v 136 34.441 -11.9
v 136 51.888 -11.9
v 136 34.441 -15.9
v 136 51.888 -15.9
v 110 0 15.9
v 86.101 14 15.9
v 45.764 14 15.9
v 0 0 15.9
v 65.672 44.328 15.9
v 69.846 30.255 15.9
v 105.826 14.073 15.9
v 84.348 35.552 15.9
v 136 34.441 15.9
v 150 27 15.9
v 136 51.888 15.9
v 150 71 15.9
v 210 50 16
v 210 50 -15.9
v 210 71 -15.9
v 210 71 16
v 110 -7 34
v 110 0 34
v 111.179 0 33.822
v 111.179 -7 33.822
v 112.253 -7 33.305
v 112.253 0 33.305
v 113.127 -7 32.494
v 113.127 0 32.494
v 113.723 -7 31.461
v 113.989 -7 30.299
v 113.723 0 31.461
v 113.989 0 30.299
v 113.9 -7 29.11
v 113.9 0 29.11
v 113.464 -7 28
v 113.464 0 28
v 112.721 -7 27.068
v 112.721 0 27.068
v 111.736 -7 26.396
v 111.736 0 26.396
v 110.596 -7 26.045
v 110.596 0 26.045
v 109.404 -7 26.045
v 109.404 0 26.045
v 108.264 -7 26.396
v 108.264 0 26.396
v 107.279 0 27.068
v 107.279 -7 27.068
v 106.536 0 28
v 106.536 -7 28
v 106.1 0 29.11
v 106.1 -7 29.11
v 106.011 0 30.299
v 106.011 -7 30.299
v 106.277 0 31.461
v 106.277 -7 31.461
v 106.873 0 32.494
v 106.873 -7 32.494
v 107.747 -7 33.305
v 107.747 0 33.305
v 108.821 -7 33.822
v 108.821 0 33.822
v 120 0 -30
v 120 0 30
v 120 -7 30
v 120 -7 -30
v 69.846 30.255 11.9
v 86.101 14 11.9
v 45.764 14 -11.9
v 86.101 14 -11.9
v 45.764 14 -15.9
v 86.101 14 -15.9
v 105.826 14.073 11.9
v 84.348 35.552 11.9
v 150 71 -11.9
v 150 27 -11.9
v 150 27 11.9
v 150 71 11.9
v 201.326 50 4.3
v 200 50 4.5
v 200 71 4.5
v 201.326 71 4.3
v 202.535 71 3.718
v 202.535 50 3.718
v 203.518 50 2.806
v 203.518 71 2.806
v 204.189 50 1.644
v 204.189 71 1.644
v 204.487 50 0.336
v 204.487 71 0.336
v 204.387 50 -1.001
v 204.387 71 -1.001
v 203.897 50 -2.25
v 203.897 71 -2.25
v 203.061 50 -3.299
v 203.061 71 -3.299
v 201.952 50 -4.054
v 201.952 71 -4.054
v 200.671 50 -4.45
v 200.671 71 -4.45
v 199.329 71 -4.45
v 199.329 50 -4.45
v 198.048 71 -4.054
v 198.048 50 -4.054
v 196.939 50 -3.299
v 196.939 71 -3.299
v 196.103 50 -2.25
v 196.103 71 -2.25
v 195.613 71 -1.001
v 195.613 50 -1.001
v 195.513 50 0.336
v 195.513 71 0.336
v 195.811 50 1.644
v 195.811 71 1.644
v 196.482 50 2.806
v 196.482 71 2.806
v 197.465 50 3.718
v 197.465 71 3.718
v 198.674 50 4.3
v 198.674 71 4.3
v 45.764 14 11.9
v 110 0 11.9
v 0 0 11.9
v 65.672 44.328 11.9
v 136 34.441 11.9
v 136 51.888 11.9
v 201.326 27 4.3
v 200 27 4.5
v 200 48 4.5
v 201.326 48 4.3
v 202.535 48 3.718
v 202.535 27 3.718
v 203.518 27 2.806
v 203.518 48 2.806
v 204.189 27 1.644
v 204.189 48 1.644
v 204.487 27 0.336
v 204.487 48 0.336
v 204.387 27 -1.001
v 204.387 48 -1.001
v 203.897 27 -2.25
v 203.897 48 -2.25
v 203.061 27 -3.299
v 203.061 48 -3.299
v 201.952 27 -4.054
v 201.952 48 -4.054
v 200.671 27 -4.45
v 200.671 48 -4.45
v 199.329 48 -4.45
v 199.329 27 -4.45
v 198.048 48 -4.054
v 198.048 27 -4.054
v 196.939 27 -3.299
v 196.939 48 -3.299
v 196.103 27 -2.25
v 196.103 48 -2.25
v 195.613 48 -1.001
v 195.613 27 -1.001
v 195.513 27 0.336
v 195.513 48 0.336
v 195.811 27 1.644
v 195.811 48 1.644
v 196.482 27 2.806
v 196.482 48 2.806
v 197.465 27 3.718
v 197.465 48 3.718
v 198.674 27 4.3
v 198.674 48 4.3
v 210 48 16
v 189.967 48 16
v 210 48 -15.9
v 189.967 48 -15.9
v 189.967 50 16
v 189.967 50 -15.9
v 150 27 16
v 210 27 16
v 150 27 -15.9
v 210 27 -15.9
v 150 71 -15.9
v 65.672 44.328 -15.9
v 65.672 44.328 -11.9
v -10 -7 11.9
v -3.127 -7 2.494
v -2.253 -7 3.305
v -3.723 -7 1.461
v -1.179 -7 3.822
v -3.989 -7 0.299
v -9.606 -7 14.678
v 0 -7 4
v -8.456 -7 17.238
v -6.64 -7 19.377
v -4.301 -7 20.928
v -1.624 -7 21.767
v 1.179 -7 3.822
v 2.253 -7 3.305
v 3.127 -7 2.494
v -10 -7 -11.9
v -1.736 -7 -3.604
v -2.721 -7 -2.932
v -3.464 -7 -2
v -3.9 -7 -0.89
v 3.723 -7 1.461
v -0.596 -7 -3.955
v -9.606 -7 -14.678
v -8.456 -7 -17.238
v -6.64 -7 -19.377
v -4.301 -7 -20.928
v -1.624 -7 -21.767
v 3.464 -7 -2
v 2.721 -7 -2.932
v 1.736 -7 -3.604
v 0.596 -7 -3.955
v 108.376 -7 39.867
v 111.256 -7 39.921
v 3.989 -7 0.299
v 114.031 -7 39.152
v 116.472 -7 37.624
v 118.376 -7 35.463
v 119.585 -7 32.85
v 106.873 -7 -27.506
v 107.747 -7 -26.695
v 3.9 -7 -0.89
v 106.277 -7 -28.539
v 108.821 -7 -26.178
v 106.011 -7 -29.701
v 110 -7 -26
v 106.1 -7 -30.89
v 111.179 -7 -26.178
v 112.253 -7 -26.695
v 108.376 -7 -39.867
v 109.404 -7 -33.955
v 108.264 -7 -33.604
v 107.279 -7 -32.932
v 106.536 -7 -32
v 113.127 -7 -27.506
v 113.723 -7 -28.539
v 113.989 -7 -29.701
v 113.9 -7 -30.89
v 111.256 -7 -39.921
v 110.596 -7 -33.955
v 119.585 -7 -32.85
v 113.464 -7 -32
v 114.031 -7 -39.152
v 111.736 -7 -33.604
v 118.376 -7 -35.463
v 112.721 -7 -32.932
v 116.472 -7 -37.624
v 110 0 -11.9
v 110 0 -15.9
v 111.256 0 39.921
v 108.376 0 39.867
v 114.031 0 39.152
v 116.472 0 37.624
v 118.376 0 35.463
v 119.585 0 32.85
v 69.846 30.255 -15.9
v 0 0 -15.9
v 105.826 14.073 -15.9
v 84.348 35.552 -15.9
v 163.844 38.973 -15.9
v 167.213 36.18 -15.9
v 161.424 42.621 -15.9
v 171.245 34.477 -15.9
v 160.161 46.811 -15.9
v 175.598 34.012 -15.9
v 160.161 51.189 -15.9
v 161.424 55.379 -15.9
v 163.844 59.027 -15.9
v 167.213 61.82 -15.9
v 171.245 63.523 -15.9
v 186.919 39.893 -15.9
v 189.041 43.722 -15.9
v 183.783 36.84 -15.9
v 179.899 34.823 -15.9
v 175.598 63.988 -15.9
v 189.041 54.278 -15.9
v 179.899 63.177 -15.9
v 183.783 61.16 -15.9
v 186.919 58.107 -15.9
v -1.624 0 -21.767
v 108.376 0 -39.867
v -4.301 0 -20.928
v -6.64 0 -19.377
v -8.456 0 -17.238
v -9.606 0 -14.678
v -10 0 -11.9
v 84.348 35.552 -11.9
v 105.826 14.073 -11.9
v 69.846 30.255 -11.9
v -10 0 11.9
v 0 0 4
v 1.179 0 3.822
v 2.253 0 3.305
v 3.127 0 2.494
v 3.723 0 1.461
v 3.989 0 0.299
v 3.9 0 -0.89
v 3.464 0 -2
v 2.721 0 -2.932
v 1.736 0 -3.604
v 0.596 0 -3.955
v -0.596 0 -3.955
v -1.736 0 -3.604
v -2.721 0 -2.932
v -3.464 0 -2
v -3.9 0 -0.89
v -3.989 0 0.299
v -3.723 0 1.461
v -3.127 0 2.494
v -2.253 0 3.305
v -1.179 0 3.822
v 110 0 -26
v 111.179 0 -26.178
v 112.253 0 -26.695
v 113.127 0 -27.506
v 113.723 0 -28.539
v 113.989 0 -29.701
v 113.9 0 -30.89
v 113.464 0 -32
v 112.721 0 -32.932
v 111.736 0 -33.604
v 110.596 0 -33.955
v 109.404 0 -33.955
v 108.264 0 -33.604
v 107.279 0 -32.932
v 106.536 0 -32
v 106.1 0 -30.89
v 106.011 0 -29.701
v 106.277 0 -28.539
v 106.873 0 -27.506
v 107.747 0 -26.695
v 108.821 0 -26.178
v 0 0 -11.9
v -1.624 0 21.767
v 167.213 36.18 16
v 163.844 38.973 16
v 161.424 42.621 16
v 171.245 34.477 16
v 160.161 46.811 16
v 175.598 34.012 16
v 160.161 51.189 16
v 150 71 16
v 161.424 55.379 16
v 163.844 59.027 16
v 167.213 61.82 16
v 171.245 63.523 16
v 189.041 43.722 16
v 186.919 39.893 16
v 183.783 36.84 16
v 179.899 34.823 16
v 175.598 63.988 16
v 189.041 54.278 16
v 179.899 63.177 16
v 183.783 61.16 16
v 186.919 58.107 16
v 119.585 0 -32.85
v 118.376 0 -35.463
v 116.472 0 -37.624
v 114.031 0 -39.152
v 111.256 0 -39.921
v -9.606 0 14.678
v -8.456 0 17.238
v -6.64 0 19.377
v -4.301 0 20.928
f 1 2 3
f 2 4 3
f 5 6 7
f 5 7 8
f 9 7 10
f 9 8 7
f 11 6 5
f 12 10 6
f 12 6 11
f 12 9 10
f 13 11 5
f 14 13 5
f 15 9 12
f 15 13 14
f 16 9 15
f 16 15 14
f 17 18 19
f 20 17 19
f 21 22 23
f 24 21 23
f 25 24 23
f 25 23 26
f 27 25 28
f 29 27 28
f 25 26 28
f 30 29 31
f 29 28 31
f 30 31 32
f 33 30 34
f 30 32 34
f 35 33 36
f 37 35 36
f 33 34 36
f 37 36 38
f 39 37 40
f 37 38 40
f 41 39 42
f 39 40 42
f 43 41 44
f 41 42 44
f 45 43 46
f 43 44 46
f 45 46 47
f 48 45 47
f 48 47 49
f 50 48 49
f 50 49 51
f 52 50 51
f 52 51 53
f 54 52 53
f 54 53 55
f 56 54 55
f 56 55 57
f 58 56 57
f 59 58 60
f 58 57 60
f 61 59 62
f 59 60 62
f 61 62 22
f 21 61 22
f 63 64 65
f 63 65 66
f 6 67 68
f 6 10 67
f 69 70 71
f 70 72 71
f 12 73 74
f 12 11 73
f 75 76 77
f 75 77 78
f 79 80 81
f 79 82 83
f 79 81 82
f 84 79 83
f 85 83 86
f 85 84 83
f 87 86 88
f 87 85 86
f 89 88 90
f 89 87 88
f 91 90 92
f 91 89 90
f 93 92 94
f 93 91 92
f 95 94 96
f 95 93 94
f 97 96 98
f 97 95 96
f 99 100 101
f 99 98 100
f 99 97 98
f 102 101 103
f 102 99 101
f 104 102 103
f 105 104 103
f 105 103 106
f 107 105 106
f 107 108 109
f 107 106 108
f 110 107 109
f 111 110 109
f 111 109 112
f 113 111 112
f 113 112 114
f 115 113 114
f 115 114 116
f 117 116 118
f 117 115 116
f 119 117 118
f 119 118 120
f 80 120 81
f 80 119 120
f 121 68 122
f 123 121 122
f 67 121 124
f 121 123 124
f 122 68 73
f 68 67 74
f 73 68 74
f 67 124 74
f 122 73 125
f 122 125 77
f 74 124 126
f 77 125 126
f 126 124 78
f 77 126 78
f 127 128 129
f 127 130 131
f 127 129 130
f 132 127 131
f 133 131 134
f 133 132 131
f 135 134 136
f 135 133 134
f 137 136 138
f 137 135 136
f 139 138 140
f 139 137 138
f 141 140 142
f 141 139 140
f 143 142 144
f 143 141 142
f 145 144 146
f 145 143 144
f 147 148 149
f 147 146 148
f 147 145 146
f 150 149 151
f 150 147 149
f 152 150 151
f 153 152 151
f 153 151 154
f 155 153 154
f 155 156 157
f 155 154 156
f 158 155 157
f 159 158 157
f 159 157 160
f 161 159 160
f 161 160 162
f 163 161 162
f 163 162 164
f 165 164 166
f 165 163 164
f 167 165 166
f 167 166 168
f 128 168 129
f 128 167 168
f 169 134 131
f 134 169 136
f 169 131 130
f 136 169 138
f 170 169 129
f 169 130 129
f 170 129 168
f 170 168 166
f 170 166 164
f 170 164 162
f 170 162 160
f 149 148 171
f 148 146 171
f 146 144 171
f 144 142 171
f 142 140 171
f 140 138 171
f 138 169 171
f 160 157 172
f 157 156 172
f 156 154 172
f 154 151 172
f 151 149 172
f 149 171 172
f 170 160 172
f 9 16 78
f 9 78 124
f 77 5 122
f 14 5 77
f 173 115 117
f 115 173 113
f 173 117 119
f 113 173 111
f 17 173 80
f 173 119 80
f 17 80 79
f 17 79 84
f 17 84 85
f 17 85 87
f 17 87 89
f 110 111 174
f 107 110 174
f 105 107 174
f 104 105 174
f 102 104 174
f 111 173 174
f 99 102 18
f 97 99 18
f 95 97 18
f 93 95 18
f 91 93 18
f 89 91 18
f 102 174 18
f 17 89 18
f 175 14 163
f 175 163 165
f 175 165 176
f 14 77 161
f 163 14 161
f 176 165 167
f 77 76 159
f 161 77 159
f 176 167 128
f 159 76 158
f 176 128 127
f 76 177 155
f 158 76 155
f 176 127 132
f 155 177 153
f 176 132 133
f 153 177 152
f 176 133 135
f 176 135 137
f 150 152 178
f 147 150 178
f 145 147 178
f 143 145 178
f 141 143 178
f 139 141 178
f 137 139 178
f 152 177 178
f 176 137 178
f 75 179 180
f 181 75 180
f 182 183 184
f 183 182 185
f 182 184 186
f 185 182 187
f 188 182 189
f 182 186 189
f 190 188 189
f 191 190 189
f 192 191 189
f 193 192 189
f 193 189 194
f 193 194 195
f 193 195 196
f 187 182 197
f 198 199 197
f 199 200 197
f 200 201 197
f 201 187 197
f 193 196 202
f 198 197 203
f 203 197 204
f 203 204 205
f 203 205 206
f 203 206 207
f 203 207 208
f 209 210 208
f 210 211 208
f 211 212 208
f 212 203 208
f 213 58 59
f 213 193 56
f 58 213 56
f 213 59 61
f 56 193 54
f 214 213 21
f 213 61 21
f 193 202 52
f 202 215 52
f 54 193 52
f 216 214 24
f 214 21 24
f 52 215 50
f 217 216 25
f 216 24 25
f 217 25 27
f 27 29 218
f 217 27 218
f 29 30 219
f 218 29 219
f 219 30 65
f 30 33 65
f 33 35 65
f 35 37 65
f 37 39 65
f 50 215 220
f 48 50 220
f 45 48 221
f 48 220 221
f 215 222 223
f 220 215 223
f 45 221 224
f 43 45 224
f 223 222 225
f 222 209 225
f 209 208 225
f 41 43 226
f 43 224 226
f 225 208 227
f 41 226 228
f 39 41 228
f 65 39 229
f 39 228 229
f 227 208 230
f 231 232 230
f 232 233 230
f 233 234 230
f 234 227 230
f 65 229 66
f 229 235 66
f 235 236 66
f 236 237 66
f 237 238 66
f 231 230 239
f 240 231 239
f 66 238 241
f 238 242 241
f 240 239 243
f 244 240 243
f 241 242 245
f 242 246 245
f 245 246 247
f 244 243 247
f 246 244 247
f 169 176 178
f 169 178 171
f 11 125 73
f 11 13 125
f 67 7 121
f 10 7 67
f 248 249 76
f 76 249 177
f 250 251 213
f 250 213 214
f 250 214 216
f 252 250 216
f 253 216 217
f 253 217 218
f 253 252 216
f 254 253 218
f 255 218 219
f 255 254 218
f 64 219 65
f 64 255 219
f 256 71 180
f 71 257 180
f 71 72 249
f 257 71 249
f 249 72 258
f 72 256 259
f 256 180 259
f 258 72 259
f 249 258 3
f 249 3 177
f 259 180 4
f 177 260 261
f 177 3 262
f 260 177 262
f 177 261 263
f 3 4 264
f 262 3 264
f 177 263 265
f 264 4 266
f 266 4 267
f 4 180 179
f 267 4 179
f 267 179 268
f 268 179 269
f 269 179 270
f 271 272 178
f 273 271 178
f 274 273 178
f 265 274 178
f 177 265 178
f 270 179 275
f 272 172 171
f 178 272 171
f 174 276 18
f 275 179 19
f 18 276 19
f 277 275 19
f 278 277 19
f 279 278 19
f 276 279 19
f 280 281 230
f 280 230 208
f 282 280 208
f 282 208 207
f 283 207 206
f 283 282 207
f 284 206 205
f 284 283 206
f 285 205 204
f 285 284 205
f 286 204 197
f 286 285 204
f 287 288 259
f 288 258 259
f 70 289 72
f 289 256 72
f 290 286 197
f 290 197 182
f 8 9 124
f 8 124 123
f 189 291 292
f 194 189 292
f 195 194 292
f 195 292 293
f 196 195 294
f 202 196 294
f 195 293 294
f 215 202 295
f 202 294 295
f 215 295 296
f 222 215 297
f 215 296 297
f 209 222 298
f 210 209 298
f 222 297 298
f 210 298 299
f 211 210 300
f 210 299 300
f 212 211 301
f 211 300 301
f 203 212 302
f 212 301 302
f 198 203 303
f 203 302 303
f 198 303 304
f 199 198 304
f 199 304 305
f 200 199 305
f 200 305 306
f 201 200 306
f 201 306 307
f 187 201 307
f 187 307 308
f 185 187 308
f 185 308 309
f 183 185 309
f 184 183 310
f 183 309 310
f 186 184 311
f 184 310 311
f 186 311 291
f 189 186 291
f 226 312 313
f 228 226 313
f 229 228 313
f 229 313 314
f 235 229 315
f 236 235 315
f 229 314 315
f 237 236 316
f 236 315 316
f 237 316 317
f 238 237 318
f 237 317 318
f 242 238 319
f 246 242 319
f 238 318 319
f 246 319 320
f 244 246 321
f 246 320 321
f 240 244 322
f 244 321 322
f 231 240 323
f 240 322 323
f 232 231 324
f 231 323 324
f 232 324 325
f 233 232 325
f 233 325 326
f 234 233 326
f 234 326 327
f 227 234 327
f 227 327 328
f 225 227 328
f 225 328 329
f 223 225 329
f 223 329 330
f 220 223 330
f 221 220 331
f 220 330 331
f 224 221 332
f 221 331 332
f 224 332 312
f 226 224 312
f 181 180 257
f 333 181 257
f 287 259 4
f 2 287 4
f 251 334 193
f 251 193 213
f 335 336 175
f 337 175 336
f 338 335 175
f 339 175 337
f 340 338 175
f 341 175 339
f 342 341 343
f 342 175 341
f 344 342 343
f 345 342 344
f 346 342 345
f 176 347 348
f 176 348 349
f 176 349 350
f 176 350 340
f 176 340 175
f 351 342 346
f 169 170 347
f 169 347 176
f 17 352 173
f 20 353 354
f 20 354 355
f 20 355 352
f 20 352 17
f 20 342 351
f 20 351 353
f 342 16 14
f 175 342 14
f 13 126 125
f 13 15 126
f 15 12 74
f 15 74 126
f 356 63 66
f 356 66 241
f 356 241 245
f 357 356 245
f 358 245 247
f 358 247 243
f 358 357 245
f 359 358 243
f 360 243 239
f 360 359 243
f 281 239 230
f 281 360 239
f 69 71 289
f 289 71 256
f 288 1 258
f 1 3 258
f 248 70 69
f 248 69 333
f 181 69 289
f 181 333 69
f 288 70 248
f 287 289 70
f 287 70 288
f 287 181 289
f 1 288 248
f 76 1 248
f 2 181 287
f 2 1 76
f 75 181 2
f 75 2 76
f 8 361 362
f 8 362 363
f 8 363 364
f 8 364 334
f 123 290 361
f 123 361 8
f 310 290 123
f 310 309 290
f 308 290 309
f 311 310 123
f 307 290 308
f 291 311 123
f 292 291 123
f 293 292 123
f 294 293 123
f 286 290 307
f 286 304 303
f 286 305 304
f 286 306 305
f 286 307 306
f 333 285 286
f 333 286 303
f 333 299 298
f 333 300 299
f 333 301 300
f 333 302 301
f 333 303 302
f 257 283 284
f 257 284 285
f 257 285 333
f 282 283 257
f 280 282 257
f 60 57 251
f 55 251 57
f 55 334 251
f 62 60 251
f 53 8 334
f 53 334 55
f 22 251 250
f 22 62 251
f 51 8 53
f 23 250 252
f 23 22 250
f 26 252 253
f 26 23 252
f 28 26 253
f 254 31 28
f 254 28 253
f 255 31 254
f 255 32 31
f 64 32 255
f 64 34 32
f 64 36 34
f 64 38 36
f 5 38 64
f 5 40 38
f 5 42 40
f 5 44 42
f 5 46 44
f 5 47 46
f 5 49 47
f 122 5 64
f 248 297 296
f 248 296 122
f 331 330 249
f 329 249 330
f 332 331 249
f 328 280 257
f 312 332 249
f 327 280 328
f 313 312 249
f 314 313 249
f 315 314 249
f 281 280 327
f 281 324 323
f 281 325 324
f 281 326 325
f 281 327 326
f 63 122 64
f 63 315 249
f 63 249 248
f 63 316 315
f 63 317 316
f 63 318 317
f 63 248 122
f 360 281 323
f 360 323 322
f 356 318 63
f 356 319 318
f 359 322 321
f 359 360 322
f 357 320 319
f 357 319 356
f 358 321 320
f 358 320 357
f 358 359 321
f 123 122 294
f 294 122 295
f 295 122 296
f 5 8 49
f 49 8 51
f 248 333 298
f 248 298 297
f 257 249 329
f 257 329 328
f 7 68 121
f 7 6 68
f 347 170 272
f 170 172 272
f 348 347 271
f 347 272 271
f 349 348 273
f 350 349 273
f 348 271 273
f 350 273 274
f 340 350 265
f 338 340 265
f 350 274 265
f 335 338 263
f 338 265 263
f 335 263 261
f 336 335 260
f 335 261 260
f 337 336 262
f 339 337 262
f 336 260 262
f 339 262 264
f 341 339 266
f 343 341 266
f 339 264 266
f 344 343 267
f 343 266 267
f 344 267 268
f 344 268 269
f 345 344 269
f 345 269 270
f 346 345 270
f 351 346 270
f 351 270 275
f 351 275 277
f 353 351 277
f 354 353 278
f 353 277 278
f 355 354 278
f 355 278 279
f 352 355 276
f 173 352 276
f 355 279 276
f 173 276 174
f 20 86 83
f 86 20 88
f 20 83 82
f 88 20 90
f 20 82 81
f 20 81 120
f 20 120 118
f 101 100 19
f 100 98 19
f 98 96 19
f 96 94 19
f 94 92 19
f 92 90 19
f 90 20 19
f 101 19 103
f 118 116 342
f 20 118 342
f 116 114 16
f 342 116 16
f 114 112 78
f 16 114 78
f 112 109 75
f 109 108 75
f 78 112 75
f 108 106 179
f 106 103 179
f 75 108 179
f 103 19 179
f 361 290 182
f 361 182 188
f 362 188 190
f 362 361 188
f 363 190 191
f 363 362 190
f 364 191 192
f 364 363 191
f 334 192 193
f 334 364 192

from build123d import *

# Parameters (mm, degrees)
BOSS_EXTRUDE1_DEPTH     = 2
BOSS_EXTRUDE2_START     = -31.8
SKETCH3_W               = 60
SKETCH3_H               = 44
BOSS_EXTRUDE2_DEPTH     = 31.8
SKETCH4_R               = 4
BOSS_EXTRUDE3_DEPTH     = 7
CUT_EXTRUDE1_DEPTH      = 229.617169084
CUT_EXTRUDE1_DEPTH_BACK = 229.617169084
CUT_EXTRUDE2_DEPTH      = 228.560980838
CUT_EXTRUDE2_DEPTH_BACK = 228.560980838
SKETCH8_R               = 4.5
BOSS_EXTRUDE4_DEPTH     = 0.1


with BuildPart() as part:
    # Sketch1 → Boss-Extrude1 (new, symmetric)
    with BuildSketch(Plane.XY.offset(13.9)):
        Polygon((150, 27), (150, 71), (65.671641791, 44.328358209), (0, 0), (110, 0), align=None)
        Polygon((45.764296173, 14), (69.845614914, 30.25489015), (86.100505063, 14), align=None, mode=Mode.SUBTRACT)
        Polygon((84.347754219, 35.551740718), (136, 51.888477569), (136, 34.440899917), (105.826026877, 14.073468059), align=None, mode=Mode.SUBTRACT)
    extrude(amount=BOSS_EXTRUDE1_DEPTH, both=True)


with BuildPart() as body_2:
    # Mirror2: mirrored copy
    add(part.part.mirror(Plane.XY))


with BuildPart() as part_1:
    add(part.part)

    add(body_2.part)  # Boss-Extrude2 merges body 2
    # Sketch3 → Boss-Extrude2 (add)
    with BuildSketch(Plane.XY.offset(15.9).offset(BOSS_EXTRUDE2_START)):
        with Locations((180, 49)):
            Rectangle(SKETCH3_W, SKETCH3_H)
    extrude(amount=BOSS_EXTRUDE2_DEPTH)

    # Sketch4 → Boss-Extrude3 (add)
    with BuildSketch(Plane(origin=(0, 0, 0), x_dir=(1, 0, 0), z_dir=(0, 1, 0))):
        with BuildLine():
            Line((108.3763786, 39.867312377), (-1.6236214, 21.767312377))
            ThreePointArc((-1.6236214, 21.767312377), (-7.623523267, 18.37162213), (-10, 11.9))
            Line((-10, 11.9), (-10, -11.9))
            ThreePointArc((-10, -11.9), (-7.623523267, -18.37162213), (-1.6236214, -21.767312377))
            Line((-1.6236214, -21.767312377), (108.3763786, -39.867312377))
            ThreePointArc((108.3763786, -39.867312377), (116.47162213, -37.623523267), (120, -30))
            Line((120, -30), (120, 30))
            ThreePointArc((120, 30), (116.47162213, 37.623523267), (108.3763786, 39.867312377))
        make_face()
        with Locations(Location((110, 30, 0), (0, 0, 270))):
            Circle(SKETCH4_R, mode=Mode.SUBTRACT)
        with Locations(Location((110, -30, 0), (0, 0, 270))):
            Circle(SKETCH4_R, mode=Mode.SUBTRACT)
        with Locations(Location((0, 0, 0), (0, 0, 270))):
            Circle(SKETCH4_R, mode=Mode.SUBTRACT)
    extrude(amount=-BOSS_EXTRUDE3_DEPTH)

    # Sketch7 → Cut-Extrude1 (cut, two sides: drawn at the far end of the back side and taken through both)
    with BuildSketch(Plane.XY.offset(15.9).offset(-CUT_EXTRUDE1_DEPTH_BACK)):
        with BuildLine():
            Line((189.966629547, 50), (210, 50))
            Line((210, 50), (210, 48))
            Line((210, 48), (189.966629547, 48))
            ThreePointArc((189.966629547, 48), (160, 49), (189.966629547, 50))
        make_face()
    extrude(amount=CUT_EXTRUDE1_DEPTH + CUT_EXTRUDE1_DEPTH_BACK, mode=Mode.SUBTRACT)

    # Sketch8 → Cut-Extrude2 (cut, two sides: drawn at the far end of the back side and taken through both)
    with BuildSketch(Plane(origin=(0, 71, 0), x_dir=(1, 0, 0), z_dir=(0, 1, 0)).offset(-CUT_EXTRUDE2_DEPTH_BACK)):
        with Locations(Location((200, 0, 0), (0, 0, 270))):
            Circle(SKETCH8_R)
    extrude(amount=CUT_EXTRUDE2_DEPTH + CUT_EXTRUDE2_DEPTH_BACK, mode=Mode.SUBTRACT)

    # Sketch9 → Boss-Extrude4 (add)
    with BuildSketch(Plane.XY.offset(15.9)):
        with BuildLine():
            Line((150, 71), (150, 27))
            Line((150, 27), (210, 27))
            Line((210, 27), (210, 48))
            Line((210, 48), (189.966629547, 48))
            ThreePointArc((189.966629547, 48), (160, 49), (189.966629547, 50))
            Line((189.966629547, 50), (210, 50))
            Line((210, 50), (210, 71))
            Line((210, 71), (150, 71))
        make_face()
    extrude(amount=BOSS_EXTRUDE4_DEPTH)


solid = part_1.part
